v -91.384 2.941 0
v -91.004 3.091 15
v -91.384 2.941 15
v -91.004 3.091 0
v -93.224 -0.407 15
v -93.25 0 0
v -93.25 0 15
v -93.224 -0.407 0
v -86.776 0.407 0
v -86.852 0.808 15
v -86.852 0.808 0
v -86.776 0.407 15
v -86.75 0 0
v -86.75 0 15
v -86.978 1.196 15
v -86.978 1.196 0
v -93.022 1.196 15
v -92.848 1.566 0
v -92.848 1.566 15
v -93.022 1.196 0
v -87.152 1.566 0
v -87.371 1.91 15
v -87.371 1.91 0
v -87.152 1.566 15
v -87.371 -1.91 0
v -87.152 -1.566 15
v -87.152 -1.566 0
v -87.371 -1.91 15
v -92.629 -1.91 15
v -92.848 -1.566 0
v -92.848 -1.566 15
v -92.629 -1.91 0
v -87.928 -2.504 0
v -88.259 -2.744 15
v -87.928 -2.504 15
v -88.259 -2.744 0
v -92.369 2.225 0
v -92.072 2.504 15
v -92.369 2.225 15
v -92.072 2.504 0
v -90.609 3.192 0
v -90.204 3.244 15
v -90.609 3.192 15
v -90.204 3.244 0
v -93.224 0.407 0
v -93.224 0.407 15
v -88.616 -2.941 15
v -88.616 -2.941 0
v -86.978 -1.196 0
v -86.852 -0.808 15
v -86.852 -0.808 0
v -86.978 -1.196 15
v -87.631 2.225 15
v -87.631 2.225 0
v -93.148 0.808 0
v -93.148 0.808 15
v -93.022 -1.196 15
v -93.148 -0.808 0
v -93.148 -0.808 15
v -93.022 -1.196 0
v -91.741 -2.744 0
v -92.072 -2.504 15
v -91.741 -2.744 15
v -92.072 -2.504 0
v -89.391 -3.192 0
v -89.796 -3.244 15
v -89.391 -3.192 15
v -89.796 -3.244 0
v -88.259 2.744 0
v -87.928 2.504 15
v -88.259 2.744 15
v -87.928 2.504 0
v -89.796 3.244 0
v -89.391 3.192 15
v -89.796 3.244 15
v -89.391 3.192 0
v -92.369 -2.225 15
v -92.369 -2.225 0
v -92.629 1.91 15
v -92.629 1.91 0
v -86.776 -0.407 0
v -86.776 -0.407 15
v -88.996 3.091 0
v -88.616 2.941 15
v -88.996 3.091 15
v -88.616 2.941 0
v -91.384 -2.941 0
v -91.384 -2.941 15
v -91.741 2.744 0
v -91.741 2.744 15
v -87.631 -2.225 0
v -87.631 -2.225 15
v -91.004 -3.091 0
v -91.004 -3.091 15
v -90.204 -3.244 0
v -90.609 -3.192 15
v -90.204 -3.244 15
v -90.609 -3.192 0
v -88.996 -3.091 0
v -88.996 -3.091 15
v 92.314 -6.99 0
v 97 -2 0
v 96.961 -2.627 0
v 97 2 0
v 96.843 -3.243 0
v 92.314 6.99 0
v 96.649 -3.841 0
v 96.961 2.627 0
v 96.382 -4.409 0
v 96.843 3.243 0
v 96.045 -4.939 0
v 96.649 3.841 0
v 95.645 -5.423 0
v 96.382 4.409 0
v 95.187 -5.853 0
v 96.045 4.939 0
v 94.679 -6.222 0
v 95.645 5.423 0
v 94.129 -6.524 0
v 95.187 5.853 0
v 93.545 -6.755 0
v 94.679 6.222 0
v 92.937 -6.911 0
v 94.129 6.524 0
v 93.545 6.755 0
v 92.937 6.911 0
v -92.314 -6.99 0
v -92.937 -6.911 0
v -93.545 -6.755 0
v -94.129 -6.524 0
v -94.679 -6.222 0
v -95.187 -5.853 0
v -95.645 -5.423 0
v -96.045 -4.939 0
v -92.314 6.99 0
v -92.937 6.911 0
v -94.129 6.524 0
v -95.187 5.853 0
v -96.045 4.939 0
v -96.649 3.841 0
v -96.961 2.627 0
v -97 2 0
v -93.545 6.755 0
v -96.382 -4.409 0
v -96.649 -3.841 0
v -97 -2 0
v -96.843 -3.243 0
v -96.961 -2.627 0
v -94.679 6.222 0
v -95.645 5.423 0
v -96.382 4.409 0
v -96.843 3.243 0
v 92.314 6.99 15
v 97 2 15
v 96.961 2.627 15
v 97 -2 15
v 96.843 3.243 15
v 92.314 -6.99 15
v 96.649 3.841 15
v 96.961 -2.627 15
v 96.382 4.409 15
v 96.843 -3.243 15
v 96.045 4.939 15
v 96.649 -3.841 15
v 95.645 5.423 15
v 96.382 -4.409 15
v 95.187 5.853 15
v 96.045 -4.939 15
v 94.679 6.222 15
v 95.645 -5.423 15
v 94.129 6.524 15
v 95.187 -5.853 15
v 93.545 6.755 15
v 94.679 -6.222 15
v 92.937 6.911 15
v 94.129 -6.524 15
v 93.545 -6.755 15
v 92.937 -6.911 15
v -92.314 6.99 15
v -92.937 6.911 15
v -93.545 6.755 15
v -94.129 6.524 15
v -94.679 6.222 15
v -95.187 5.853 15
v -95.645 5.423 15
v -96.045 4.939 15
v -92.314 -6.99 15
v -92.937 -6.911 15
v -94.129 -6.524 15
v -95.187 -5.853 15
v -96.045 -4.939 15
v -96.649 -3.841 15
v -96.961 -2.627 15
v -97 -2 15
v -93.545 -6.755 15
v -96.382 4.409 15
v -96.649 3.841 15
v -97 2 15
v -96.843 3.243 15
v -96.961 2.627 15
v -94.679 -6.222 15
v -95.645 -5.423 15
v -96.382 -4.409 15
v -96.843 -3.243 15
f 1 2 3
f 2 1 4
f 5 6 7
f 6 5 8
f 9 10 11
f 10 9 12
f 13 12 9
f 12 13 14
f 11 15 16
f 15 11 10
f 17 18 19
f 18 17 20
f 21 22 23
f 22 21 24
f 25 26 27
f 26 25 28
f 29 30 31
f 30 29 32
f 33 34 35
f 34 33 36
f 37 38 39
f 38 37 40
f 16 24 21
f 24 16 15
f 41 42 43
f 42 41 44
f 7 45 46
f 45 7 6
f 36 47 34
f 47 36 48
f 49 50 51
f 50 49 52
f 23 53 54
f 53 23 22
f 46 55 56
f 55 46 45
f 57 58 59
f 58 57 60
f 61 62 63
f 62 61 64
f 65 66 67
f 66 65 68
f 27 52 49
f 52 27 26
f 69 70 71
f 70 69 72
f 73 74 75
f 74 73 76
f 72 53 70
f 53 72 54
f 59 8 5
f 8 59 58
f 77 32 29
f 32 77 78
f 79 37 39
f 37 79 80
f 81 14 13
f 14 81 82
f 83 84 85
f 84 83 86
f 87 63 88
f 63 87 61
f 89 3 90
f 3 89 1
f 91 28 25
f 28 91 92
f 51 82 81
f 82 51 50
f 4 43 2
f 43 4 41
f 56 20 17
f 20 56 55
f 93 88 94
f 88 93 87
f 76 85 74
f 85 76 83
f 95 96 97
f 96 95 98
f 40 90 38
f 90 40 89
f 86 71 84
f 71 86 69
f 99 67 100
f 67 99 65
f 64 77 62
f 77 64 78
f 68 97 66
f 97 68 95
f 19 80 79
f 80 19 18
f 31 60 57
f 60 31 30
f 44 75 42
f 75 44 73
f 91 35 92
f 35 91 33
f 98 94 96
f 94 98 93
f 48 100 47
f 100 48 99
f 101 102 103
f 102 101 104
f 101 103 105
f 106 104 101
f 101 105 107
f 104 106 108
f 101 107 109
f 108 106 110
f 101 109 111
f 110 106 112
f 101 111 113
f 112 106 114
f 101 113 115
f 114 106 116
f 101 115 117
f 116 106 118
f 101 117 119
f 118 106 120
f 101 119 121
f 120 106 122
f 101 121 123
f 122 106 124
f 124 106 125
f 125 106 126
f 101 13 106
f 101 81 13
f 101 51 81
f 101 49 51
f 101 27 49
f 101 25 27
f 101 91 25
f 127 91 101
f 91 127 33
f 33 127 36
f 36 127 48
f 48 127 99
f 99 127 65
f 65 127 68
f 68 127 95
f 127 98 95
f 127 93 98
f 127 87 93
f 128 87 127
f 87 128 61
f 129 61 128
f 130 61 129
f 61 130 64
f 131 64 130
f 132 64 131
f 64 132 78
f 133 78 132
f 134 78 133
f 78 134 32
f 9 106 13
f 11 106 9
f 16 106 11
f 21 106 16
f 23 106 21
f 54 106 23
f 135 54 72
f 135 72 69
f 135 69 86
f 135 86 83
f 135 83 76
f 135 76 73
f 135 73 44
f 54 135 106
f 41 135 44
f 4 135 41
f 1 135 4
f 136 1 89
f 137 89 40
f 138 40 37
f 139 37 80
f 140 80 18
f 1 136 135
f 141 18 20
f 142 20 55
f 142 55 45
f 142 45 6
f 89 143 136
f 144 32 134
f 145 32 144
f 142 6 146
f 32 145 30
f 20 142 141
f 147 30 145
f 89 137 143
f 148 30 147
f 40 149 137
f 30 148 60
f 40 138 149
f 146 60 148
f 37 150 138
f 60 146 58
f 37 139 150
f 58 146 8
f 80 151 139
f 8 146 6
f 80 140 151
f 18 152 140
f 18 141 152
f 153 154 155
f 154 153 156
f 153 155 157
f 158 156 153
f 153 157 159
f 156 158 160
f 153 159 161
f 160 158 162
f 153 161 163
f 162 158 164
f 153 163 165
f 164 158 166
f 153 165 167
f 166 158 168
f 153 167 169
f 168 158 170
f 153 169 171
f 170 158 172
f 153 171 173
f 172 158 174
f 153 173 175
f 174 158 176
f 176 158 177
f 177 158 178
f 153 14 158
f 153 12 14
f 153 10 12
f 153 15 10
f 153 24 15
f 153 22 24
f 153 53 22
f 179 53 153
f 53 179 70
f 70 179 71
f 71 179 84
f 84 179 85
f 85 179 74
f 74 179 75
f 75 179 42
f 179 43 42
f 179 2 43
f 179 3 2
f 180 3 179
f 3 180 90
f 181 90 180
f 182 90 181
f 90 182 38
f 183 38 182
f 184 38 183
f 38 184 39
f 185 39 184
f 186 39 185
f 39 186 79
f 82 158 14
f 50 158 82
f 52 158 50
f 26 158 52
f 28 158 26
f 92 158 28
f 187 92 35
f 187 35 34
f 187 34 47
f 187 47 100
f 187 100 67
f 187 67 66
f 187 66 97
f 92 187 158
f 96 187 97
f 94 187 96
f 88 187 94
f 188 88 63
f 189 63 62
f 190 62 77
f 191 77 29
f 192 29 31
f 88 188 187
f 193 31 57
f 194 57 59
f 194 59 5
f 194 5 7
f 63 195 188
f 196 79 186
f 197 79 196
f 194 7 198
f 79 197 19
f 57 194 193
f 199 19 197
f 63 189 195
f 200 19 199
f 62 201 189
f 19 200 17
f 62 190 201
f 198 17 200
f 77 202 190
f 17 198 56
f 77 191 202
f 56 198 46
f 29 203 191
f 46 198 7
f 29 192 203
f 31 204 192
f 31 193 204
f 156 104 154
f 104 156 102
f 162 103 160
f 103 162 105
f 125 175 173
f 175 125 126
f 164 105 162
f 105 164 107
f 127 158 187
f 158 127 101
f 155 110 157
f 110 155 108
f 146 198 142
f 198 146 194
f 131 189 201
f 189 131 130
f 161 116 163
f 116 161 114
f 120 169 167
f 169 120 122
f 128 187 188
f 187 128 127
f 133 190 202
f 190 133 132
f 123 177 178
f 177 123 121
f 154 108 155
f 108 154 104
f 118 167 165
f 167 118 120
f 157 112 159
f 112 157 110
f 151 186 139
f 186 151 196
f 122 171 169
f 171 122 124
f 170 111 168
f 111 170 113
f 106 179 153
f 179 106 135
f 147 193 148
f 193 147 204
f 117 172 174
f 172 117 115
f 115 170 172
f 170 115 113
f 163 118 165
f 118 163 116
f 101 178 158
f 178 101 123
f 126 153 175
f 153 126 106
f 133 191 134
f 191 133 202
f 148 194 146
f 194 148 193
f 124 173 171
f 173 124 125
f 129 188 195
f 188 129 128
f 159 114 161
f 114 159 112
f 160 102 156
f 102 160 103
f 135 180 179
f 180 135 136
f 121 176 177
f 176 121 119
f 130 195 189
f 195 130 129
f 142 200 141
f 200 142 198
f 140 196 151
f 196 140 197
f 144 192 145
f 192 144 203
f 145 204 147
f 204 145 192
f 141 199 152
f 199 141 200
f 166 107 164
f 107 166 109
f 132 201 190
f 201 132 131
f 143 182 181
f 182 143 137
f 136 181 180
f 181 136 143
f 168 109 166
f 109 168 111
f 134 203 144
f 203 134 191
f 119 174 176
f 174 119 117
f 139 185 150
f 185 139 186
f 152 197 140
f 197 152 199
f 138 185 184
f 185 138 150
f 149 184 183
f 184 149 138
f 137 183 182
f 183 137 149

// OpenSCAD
$fn = 50;


difference() {
	union() {
		hull() {
			translate(v = [-92.0000000000, 2.0000000000, 0]) {
				cylinder(h = 15, r = 5);
			}
			translate(v = [92.0000000000, 2.0000000000, 0]) {
				cylinder(h = 15, r = 5);
			}
			translate(v = [-92.0000000000, -2.0000000000, 0]) {
				cylinder(h = 15, r = 5);
			}
			translate(v = [92.0000000000, -2.0000000000, 0]) {
				cylinder(h = 15, r = 5);
			}
		}
	}
	union() {
		translate(v = [-90.0000000000, 0.0000000000, 0]) {
			cylinder(h = 15, r = 3.2500000000);
		}
		translate(v = [-90.0000000000, 0.0000000000, 0]) {
			cylinder(h = 15, r = 1.8000000000);
		}
		translate(v = [-90.0000000000, 0.0000000000, 0]) {
			cylinder(h = 15, r = 1.8000000000);
		}
		translate(v = [-90.0000000000, 0.0000000000, 0]) {
			cylinder(h = 15, r = 1.8000000000);
		}
	}
}
